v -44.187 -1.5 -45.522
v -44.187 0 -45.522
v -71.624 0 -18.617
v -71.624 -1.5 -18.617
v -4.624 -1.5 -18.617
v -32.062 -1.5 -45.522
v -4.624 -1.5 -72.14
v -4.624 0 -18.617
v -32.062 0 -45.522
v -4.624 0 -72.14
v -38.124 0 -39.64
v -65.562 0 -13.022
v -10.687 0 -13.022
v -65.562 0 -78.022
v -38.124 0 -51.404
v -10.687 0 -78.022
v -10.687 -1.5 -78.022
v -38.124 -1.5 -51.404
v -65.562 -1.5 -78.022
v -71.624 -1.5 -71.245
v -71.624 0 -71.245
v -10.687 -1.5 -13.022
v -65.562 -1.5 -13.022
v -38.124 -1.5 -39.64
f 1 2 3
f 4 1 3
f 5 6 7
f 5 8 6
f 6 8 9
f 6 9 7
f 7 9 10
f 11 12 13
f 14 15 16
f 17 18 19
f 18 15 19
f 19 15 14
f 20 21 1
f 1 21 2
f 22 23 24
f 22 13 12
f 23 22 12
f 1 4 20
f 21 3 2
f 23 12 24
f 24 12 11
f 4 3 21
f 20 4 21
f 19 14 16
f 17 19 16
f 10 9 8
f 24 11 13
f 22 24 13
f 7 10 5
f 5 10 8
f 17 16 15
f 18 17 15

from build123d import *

# Parameters (mm, degrees)
F1_DEPTH = 1.5


# Not quite as in the source:
# - a feature names something its author has since deleted; it is built from what else it names


with BuildPart() as f1:
    # F0 (on Front) → F1 (new body)
    with BuildSketch(Plane.XZ):
        Polygon((-10.6868883812, -13.0220385311), (-65.5616819859, -13.0220385311), (-38.1242851835, -39.6404085632), align=None)
    extrude(amount=F1_DEPTH)


with BuildPart() as f1b:
    # F0 (on Front) → F1, piece 2 (new body)
    with BuildSketch(Plane.XZ):
        Polygon((-38.1242851835, -51.403668499), (-65.5616819859, -78.0220385311), (-10.6868883812, -78.0220385311), align=None)
    extrude(amount=F1_DEPTH)


with BuildPart() as f1c:
    # F0 (on Front) → F1, piece 3 (new body)
    with BuildSketch(Plane.XZ):
        Polygon((-4.6242851835, -72.1404085632), (-4.6242851835, -18.6169743538), (-32.0616819859, -45.5220385311), align=None)
    extrude(amount=F1_DEPTH)


with BuildPart() as f1d:
    # F0 (on Front) → F1, piece 4 (new body)
    with BuildSketch(Plane.XZ):
        Polygon((-44.1868883812, -45.5220385311), (-71.6242851835, -18.6169743538), (-71.6242851835, -71.2447017431), align=None)
    extrude(amount=F1_DEPTH)


solid = Compound([f1.part, f1b.part, f1c.part, f1d.part])
